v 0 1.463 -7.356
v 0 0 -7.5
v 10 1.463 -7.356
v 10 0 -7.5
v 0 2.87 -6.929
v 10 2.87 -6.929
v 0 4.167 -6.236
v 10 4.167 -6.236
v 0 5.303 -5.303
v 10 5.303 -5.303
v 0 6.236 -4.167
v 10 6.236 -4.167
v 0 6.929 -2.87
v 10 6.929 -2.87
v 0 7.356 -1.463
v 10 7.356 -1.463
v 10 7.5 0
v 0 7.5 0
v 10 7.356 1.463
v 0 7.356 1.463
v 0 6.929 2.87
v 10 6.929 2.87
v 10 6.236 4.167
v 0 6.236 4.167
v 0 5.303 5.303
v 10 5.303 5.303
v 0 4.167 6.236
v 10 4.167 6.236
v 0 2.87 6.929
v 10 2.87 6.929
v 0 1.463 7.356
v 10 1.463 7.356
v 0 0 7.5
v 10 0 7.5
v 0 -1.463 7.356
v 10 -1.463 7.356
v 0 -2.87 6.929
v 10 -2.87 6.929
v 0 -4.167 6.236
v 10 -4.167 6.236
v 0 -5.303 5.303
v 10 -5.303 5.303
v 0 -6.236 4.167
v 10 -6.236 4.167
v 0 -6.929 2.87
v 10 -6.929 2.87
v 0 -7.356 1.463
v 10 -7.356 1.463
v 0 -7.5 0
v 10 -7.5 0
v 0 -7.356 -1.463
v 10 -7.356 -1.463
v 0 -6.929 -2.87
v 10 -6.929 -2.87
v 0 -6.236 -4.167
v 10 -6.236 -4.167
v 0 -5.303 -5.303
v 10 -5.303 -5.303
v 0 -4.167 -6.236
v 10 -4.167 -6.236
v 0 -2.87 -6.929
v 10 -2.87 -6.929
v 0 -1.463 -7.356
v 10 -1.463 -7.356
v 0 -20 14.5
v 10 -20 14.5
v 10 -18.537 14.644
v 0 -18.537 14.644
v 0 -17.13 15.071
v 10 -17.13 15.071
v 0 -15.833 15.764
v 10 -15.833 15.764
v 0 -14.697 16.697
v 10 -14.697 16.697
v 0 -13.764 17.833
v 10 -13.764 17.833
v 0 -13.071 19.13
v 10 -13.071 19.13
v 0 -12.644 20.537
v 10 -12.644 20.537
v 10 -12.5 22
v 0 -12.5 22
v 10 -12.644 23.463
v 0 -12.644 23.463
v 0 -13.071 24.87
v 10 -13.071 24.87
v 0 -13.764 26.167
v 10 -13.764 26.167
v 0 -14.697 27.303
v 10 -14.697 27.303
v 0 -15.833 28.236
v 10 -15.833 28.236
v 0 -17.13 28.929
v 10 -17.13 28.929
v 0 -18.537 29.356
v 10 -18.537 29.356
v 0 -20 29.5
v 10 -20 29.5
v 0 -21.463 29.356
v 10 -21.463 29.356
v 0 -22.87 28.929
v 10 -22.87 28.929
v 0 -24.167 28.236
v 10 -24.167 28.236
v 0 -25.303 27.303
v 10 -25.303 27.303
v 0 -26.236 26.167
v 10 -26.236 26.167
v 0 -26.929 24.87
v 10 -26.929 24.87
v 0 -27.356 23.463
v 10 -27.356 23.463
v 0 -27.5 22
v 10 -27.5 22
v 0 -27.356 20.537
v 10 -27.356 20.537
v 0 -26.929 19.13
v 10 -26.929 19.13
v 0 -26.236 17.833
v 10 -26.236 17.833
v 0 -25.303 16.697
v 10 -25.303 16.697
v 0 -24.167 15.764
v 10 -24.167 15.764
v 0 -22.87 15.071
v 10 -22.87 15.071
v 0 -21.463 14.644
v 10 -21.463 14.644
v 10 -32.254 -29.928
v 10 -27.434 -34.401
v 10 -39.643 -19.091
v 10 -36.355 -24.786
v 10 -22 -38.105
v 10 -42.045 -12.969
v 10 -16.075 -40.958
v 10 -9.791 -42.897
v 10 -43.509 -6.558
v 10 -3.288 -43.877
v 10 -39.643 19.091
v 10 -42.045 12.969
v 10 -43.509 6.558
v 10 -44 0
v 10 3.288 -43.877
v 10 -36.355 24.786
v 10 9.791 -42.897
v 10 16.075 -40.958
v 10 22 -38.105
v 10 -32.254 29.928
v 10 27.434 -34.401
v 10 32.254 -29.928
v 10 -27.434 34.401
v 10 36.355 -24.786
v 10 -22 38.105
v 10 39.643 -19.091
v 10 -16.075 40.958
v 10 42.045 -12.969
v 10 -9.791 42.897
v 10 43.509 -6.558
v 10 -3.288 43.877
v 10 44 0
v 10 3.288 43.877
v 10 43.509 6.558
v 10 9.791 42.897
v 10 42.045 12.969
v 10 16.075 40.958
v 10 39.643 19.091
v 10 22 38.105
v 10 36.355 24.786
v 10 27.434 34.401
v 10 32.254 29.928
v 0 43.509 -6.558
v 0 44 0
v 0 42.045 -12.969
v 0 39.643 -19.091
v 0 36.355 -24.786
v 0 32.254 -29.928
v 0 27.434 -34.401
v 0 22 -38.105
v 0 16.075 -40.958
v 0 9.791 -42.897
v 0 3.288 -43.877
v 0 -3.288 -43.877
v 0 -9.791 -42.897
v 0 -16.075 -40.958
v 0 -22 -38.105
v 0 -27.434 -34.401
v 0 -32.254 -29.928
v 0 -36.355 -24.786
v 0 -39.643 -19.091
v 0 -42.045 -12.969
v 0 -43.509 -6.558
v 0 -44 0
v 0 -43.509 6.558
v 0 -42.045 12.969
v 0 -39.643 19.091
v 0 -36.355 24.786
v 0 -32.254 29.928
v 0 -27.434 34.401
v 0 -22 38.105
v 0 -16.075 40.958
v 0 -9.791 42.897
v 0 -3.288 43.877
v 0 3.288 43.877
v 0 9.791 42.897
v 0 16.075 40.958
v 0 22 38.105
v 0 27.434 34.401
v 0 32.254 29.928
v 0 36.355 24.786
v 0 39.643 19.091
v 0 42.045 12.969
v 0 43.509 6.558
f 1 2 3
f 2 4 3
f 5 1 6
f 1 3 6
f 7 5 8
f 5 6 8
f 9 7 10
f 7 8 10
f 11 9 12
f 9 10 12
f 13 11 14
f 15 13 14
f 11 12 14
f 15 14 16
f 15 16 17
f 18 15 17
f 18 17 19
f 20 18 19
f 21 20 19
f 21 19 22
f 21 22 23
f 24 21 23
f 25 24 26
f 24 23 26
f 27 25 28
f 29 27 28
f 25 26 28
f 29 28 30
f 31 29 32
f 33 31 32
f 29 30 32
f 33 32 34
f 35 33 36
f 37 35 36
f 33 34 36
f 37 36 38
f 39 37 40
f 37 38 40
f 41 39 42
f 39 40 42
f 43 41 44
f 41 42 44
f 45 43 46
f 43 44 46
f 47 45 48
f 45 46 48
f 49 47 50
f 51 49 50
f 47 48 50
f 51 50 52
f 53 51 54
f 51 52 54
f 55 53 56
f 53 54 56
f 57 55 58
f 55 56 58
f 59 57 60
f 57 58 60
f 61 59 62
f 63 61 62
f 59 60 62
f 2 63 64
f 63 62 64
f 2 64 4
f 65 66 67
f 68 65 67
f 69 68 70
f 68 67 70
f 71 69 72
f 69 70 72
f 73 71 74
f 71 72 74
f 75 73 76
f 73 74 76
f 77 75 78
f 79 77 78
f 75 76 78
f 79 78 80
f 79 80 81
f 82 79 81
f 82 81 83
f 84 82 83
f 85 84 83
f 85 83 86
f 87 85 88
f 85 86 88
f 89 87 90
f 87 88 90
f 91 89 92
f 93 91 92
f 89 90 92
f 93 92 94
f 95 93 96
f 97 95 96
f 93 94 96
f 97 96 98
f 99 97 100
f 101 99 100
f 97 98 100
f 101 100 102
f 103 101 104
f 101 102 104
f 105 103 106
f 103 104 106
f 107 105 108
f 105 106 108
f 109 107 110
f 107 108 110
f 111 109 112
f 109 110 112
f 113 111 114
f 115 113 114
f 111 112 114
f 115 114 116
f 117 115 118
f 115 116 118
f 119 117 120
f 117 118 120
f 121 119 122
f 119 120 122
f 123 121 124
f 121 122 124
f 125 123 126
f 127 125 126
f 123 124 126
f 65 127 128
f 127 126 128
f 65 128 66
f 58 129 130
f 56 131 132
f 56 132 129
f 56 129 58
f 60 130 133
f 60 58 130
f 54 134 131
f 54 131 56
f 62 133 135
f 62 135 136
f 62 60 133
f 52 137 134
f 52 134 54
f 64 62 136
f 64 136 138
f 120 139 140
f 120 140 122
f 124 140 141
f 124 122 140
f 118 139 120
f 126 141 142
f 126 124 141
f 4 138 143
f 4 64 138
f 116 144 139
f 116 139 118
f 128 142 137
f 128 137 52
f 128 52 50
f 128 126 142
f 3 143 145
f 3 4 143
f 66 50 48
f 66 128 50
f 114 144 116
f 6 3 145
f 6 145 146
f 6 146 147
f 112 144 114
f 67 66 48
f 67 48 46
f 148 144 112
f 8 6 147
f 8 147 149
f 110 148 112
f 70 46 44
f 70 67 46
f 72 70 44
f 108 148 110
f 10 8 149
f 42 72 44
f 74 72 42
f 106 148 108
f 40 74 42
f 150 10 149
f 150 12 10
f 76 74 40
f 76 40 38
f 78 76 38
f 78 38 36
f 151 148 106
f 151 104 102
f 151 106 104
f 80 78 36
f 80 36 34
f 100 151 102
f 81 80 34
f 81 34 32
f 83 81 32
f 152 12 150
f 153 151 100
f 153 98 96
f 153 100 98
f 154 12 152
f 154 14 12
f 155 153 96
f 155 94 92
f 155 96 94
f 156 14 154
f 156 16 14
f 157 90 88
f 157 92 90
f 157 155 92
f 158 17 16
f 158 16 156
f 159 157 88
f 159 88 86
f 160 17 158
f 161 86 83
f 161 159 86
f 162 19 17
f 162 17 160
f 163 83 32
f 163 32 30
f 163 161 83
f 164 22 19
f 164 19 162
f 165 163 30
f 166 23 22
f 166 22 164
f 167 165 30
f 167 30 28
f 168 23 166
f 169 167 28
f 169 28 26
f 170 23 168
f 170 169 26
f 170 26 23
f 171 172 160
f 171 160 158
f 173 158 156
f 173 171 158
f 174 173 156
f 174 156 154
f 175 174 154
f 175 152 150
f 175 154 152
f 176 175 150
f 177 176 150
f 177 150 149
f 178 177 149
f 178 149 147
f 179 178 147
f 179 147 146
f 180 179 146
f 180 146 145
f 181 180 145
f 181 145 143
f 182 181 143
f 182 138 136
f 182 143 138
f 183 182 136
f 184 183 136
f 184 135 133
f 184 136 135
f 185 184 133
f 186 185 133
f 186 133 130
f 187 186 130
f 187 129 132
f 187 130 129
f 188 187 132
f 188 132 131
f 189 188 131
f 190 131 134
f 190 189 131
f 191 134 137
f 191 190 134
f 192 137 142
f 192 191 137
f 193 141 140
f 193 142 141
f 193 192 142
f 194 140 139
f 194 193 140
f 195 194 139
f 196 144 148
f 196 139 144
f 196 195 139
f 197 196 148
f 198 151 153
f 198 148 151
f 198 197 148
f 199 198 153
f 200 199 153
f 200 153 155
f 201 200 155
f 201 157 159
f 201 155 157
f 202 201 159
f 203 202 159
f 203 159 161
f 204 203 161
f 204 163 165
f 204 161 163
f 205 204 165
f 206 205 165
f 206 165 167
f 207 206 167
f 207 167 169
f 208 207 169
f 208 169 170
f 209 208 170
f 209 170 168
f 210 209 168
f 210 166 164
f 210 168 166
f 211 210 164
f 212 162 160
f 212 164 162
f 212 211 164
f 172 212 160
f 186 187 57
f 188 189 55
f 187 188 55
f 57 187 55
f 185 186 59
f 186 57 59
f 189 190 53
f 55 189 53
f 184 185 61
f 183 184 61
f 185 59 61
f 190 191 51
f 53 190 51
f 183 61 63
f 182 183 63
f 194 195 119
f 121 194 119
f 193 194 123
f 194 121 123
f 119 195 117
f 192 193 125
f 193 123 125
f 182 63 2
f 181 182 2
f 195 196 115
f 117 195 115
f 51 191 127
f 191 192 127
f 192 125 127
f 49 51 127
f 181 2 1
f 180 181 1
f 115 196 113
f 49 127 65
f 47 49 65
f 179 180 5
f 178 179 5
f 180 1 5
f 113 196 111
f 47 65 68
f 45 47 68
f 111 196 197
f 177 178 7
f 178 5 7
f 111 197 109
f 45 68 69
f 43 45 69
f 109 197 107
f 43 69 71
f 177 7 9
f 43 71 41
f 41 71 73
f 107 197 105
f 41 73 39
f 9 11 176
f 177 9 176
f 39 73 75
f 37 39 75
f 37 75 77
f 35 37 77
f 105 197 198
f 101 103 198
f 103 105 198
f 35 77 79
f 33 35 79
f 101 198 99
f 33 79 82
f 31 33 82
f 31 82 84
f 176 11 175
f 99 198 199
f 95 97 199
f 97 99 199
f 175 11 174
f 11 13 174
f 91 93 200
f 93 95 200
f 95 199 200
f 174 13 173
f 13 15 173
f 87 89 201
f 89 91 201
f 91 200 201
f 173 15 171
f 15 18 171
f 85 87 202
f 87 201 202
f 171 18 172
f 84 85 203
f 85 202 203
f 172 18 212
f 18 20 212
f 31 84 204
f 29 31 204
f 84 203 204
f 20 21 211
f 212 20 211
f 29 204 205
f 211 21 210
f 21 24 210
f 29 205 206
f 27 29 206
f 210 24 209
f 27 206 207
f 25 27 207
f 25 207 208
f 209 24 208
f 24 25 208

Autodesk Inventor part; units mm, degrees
ref_plane "YZ Plane" through (0, 0, 0) normal (1, 0, 0) x (0, 1, 0)
ref_plane "XZ Plane" through (0, 0, 0) normal (0, 1, 0) x (-1, 0, 0)
ref_plane "XY Plane" through (0, 0, 0) normal (0, 0, 1) x (1, 0, 0)
sketch "Sketch1" plane through (0, 0, 0) normal (1, 0, 0) x (0, 1, 0)
  circle A0 centre (0, 0) radius 44
  dimension "d0" = 88
extrude "Extrusion1" add sketch "Sketch1" along normal blind 10
sketch "Sketch2" plane through (10, 0, 0) normal (1, 0, 0) x (0, 0, -1)
  circle A0 centre (0, 0) radius 7.5
  dimension "d3" = 15
extrude "Extrusion2" cut sketch "Sketch2" against normal through all
sketch "Sketch3" plane through (10, 0, 0) normal (1, 0, 0) x (0, 0, -1)
  circle A0 centre (-22, -20) radius 7.5
  point P0 (0, 0)
  dimension "d6" = 15
extrude "Extrusion3" cut sketch "Sketch3" against normal through all
properties part number "disk"
